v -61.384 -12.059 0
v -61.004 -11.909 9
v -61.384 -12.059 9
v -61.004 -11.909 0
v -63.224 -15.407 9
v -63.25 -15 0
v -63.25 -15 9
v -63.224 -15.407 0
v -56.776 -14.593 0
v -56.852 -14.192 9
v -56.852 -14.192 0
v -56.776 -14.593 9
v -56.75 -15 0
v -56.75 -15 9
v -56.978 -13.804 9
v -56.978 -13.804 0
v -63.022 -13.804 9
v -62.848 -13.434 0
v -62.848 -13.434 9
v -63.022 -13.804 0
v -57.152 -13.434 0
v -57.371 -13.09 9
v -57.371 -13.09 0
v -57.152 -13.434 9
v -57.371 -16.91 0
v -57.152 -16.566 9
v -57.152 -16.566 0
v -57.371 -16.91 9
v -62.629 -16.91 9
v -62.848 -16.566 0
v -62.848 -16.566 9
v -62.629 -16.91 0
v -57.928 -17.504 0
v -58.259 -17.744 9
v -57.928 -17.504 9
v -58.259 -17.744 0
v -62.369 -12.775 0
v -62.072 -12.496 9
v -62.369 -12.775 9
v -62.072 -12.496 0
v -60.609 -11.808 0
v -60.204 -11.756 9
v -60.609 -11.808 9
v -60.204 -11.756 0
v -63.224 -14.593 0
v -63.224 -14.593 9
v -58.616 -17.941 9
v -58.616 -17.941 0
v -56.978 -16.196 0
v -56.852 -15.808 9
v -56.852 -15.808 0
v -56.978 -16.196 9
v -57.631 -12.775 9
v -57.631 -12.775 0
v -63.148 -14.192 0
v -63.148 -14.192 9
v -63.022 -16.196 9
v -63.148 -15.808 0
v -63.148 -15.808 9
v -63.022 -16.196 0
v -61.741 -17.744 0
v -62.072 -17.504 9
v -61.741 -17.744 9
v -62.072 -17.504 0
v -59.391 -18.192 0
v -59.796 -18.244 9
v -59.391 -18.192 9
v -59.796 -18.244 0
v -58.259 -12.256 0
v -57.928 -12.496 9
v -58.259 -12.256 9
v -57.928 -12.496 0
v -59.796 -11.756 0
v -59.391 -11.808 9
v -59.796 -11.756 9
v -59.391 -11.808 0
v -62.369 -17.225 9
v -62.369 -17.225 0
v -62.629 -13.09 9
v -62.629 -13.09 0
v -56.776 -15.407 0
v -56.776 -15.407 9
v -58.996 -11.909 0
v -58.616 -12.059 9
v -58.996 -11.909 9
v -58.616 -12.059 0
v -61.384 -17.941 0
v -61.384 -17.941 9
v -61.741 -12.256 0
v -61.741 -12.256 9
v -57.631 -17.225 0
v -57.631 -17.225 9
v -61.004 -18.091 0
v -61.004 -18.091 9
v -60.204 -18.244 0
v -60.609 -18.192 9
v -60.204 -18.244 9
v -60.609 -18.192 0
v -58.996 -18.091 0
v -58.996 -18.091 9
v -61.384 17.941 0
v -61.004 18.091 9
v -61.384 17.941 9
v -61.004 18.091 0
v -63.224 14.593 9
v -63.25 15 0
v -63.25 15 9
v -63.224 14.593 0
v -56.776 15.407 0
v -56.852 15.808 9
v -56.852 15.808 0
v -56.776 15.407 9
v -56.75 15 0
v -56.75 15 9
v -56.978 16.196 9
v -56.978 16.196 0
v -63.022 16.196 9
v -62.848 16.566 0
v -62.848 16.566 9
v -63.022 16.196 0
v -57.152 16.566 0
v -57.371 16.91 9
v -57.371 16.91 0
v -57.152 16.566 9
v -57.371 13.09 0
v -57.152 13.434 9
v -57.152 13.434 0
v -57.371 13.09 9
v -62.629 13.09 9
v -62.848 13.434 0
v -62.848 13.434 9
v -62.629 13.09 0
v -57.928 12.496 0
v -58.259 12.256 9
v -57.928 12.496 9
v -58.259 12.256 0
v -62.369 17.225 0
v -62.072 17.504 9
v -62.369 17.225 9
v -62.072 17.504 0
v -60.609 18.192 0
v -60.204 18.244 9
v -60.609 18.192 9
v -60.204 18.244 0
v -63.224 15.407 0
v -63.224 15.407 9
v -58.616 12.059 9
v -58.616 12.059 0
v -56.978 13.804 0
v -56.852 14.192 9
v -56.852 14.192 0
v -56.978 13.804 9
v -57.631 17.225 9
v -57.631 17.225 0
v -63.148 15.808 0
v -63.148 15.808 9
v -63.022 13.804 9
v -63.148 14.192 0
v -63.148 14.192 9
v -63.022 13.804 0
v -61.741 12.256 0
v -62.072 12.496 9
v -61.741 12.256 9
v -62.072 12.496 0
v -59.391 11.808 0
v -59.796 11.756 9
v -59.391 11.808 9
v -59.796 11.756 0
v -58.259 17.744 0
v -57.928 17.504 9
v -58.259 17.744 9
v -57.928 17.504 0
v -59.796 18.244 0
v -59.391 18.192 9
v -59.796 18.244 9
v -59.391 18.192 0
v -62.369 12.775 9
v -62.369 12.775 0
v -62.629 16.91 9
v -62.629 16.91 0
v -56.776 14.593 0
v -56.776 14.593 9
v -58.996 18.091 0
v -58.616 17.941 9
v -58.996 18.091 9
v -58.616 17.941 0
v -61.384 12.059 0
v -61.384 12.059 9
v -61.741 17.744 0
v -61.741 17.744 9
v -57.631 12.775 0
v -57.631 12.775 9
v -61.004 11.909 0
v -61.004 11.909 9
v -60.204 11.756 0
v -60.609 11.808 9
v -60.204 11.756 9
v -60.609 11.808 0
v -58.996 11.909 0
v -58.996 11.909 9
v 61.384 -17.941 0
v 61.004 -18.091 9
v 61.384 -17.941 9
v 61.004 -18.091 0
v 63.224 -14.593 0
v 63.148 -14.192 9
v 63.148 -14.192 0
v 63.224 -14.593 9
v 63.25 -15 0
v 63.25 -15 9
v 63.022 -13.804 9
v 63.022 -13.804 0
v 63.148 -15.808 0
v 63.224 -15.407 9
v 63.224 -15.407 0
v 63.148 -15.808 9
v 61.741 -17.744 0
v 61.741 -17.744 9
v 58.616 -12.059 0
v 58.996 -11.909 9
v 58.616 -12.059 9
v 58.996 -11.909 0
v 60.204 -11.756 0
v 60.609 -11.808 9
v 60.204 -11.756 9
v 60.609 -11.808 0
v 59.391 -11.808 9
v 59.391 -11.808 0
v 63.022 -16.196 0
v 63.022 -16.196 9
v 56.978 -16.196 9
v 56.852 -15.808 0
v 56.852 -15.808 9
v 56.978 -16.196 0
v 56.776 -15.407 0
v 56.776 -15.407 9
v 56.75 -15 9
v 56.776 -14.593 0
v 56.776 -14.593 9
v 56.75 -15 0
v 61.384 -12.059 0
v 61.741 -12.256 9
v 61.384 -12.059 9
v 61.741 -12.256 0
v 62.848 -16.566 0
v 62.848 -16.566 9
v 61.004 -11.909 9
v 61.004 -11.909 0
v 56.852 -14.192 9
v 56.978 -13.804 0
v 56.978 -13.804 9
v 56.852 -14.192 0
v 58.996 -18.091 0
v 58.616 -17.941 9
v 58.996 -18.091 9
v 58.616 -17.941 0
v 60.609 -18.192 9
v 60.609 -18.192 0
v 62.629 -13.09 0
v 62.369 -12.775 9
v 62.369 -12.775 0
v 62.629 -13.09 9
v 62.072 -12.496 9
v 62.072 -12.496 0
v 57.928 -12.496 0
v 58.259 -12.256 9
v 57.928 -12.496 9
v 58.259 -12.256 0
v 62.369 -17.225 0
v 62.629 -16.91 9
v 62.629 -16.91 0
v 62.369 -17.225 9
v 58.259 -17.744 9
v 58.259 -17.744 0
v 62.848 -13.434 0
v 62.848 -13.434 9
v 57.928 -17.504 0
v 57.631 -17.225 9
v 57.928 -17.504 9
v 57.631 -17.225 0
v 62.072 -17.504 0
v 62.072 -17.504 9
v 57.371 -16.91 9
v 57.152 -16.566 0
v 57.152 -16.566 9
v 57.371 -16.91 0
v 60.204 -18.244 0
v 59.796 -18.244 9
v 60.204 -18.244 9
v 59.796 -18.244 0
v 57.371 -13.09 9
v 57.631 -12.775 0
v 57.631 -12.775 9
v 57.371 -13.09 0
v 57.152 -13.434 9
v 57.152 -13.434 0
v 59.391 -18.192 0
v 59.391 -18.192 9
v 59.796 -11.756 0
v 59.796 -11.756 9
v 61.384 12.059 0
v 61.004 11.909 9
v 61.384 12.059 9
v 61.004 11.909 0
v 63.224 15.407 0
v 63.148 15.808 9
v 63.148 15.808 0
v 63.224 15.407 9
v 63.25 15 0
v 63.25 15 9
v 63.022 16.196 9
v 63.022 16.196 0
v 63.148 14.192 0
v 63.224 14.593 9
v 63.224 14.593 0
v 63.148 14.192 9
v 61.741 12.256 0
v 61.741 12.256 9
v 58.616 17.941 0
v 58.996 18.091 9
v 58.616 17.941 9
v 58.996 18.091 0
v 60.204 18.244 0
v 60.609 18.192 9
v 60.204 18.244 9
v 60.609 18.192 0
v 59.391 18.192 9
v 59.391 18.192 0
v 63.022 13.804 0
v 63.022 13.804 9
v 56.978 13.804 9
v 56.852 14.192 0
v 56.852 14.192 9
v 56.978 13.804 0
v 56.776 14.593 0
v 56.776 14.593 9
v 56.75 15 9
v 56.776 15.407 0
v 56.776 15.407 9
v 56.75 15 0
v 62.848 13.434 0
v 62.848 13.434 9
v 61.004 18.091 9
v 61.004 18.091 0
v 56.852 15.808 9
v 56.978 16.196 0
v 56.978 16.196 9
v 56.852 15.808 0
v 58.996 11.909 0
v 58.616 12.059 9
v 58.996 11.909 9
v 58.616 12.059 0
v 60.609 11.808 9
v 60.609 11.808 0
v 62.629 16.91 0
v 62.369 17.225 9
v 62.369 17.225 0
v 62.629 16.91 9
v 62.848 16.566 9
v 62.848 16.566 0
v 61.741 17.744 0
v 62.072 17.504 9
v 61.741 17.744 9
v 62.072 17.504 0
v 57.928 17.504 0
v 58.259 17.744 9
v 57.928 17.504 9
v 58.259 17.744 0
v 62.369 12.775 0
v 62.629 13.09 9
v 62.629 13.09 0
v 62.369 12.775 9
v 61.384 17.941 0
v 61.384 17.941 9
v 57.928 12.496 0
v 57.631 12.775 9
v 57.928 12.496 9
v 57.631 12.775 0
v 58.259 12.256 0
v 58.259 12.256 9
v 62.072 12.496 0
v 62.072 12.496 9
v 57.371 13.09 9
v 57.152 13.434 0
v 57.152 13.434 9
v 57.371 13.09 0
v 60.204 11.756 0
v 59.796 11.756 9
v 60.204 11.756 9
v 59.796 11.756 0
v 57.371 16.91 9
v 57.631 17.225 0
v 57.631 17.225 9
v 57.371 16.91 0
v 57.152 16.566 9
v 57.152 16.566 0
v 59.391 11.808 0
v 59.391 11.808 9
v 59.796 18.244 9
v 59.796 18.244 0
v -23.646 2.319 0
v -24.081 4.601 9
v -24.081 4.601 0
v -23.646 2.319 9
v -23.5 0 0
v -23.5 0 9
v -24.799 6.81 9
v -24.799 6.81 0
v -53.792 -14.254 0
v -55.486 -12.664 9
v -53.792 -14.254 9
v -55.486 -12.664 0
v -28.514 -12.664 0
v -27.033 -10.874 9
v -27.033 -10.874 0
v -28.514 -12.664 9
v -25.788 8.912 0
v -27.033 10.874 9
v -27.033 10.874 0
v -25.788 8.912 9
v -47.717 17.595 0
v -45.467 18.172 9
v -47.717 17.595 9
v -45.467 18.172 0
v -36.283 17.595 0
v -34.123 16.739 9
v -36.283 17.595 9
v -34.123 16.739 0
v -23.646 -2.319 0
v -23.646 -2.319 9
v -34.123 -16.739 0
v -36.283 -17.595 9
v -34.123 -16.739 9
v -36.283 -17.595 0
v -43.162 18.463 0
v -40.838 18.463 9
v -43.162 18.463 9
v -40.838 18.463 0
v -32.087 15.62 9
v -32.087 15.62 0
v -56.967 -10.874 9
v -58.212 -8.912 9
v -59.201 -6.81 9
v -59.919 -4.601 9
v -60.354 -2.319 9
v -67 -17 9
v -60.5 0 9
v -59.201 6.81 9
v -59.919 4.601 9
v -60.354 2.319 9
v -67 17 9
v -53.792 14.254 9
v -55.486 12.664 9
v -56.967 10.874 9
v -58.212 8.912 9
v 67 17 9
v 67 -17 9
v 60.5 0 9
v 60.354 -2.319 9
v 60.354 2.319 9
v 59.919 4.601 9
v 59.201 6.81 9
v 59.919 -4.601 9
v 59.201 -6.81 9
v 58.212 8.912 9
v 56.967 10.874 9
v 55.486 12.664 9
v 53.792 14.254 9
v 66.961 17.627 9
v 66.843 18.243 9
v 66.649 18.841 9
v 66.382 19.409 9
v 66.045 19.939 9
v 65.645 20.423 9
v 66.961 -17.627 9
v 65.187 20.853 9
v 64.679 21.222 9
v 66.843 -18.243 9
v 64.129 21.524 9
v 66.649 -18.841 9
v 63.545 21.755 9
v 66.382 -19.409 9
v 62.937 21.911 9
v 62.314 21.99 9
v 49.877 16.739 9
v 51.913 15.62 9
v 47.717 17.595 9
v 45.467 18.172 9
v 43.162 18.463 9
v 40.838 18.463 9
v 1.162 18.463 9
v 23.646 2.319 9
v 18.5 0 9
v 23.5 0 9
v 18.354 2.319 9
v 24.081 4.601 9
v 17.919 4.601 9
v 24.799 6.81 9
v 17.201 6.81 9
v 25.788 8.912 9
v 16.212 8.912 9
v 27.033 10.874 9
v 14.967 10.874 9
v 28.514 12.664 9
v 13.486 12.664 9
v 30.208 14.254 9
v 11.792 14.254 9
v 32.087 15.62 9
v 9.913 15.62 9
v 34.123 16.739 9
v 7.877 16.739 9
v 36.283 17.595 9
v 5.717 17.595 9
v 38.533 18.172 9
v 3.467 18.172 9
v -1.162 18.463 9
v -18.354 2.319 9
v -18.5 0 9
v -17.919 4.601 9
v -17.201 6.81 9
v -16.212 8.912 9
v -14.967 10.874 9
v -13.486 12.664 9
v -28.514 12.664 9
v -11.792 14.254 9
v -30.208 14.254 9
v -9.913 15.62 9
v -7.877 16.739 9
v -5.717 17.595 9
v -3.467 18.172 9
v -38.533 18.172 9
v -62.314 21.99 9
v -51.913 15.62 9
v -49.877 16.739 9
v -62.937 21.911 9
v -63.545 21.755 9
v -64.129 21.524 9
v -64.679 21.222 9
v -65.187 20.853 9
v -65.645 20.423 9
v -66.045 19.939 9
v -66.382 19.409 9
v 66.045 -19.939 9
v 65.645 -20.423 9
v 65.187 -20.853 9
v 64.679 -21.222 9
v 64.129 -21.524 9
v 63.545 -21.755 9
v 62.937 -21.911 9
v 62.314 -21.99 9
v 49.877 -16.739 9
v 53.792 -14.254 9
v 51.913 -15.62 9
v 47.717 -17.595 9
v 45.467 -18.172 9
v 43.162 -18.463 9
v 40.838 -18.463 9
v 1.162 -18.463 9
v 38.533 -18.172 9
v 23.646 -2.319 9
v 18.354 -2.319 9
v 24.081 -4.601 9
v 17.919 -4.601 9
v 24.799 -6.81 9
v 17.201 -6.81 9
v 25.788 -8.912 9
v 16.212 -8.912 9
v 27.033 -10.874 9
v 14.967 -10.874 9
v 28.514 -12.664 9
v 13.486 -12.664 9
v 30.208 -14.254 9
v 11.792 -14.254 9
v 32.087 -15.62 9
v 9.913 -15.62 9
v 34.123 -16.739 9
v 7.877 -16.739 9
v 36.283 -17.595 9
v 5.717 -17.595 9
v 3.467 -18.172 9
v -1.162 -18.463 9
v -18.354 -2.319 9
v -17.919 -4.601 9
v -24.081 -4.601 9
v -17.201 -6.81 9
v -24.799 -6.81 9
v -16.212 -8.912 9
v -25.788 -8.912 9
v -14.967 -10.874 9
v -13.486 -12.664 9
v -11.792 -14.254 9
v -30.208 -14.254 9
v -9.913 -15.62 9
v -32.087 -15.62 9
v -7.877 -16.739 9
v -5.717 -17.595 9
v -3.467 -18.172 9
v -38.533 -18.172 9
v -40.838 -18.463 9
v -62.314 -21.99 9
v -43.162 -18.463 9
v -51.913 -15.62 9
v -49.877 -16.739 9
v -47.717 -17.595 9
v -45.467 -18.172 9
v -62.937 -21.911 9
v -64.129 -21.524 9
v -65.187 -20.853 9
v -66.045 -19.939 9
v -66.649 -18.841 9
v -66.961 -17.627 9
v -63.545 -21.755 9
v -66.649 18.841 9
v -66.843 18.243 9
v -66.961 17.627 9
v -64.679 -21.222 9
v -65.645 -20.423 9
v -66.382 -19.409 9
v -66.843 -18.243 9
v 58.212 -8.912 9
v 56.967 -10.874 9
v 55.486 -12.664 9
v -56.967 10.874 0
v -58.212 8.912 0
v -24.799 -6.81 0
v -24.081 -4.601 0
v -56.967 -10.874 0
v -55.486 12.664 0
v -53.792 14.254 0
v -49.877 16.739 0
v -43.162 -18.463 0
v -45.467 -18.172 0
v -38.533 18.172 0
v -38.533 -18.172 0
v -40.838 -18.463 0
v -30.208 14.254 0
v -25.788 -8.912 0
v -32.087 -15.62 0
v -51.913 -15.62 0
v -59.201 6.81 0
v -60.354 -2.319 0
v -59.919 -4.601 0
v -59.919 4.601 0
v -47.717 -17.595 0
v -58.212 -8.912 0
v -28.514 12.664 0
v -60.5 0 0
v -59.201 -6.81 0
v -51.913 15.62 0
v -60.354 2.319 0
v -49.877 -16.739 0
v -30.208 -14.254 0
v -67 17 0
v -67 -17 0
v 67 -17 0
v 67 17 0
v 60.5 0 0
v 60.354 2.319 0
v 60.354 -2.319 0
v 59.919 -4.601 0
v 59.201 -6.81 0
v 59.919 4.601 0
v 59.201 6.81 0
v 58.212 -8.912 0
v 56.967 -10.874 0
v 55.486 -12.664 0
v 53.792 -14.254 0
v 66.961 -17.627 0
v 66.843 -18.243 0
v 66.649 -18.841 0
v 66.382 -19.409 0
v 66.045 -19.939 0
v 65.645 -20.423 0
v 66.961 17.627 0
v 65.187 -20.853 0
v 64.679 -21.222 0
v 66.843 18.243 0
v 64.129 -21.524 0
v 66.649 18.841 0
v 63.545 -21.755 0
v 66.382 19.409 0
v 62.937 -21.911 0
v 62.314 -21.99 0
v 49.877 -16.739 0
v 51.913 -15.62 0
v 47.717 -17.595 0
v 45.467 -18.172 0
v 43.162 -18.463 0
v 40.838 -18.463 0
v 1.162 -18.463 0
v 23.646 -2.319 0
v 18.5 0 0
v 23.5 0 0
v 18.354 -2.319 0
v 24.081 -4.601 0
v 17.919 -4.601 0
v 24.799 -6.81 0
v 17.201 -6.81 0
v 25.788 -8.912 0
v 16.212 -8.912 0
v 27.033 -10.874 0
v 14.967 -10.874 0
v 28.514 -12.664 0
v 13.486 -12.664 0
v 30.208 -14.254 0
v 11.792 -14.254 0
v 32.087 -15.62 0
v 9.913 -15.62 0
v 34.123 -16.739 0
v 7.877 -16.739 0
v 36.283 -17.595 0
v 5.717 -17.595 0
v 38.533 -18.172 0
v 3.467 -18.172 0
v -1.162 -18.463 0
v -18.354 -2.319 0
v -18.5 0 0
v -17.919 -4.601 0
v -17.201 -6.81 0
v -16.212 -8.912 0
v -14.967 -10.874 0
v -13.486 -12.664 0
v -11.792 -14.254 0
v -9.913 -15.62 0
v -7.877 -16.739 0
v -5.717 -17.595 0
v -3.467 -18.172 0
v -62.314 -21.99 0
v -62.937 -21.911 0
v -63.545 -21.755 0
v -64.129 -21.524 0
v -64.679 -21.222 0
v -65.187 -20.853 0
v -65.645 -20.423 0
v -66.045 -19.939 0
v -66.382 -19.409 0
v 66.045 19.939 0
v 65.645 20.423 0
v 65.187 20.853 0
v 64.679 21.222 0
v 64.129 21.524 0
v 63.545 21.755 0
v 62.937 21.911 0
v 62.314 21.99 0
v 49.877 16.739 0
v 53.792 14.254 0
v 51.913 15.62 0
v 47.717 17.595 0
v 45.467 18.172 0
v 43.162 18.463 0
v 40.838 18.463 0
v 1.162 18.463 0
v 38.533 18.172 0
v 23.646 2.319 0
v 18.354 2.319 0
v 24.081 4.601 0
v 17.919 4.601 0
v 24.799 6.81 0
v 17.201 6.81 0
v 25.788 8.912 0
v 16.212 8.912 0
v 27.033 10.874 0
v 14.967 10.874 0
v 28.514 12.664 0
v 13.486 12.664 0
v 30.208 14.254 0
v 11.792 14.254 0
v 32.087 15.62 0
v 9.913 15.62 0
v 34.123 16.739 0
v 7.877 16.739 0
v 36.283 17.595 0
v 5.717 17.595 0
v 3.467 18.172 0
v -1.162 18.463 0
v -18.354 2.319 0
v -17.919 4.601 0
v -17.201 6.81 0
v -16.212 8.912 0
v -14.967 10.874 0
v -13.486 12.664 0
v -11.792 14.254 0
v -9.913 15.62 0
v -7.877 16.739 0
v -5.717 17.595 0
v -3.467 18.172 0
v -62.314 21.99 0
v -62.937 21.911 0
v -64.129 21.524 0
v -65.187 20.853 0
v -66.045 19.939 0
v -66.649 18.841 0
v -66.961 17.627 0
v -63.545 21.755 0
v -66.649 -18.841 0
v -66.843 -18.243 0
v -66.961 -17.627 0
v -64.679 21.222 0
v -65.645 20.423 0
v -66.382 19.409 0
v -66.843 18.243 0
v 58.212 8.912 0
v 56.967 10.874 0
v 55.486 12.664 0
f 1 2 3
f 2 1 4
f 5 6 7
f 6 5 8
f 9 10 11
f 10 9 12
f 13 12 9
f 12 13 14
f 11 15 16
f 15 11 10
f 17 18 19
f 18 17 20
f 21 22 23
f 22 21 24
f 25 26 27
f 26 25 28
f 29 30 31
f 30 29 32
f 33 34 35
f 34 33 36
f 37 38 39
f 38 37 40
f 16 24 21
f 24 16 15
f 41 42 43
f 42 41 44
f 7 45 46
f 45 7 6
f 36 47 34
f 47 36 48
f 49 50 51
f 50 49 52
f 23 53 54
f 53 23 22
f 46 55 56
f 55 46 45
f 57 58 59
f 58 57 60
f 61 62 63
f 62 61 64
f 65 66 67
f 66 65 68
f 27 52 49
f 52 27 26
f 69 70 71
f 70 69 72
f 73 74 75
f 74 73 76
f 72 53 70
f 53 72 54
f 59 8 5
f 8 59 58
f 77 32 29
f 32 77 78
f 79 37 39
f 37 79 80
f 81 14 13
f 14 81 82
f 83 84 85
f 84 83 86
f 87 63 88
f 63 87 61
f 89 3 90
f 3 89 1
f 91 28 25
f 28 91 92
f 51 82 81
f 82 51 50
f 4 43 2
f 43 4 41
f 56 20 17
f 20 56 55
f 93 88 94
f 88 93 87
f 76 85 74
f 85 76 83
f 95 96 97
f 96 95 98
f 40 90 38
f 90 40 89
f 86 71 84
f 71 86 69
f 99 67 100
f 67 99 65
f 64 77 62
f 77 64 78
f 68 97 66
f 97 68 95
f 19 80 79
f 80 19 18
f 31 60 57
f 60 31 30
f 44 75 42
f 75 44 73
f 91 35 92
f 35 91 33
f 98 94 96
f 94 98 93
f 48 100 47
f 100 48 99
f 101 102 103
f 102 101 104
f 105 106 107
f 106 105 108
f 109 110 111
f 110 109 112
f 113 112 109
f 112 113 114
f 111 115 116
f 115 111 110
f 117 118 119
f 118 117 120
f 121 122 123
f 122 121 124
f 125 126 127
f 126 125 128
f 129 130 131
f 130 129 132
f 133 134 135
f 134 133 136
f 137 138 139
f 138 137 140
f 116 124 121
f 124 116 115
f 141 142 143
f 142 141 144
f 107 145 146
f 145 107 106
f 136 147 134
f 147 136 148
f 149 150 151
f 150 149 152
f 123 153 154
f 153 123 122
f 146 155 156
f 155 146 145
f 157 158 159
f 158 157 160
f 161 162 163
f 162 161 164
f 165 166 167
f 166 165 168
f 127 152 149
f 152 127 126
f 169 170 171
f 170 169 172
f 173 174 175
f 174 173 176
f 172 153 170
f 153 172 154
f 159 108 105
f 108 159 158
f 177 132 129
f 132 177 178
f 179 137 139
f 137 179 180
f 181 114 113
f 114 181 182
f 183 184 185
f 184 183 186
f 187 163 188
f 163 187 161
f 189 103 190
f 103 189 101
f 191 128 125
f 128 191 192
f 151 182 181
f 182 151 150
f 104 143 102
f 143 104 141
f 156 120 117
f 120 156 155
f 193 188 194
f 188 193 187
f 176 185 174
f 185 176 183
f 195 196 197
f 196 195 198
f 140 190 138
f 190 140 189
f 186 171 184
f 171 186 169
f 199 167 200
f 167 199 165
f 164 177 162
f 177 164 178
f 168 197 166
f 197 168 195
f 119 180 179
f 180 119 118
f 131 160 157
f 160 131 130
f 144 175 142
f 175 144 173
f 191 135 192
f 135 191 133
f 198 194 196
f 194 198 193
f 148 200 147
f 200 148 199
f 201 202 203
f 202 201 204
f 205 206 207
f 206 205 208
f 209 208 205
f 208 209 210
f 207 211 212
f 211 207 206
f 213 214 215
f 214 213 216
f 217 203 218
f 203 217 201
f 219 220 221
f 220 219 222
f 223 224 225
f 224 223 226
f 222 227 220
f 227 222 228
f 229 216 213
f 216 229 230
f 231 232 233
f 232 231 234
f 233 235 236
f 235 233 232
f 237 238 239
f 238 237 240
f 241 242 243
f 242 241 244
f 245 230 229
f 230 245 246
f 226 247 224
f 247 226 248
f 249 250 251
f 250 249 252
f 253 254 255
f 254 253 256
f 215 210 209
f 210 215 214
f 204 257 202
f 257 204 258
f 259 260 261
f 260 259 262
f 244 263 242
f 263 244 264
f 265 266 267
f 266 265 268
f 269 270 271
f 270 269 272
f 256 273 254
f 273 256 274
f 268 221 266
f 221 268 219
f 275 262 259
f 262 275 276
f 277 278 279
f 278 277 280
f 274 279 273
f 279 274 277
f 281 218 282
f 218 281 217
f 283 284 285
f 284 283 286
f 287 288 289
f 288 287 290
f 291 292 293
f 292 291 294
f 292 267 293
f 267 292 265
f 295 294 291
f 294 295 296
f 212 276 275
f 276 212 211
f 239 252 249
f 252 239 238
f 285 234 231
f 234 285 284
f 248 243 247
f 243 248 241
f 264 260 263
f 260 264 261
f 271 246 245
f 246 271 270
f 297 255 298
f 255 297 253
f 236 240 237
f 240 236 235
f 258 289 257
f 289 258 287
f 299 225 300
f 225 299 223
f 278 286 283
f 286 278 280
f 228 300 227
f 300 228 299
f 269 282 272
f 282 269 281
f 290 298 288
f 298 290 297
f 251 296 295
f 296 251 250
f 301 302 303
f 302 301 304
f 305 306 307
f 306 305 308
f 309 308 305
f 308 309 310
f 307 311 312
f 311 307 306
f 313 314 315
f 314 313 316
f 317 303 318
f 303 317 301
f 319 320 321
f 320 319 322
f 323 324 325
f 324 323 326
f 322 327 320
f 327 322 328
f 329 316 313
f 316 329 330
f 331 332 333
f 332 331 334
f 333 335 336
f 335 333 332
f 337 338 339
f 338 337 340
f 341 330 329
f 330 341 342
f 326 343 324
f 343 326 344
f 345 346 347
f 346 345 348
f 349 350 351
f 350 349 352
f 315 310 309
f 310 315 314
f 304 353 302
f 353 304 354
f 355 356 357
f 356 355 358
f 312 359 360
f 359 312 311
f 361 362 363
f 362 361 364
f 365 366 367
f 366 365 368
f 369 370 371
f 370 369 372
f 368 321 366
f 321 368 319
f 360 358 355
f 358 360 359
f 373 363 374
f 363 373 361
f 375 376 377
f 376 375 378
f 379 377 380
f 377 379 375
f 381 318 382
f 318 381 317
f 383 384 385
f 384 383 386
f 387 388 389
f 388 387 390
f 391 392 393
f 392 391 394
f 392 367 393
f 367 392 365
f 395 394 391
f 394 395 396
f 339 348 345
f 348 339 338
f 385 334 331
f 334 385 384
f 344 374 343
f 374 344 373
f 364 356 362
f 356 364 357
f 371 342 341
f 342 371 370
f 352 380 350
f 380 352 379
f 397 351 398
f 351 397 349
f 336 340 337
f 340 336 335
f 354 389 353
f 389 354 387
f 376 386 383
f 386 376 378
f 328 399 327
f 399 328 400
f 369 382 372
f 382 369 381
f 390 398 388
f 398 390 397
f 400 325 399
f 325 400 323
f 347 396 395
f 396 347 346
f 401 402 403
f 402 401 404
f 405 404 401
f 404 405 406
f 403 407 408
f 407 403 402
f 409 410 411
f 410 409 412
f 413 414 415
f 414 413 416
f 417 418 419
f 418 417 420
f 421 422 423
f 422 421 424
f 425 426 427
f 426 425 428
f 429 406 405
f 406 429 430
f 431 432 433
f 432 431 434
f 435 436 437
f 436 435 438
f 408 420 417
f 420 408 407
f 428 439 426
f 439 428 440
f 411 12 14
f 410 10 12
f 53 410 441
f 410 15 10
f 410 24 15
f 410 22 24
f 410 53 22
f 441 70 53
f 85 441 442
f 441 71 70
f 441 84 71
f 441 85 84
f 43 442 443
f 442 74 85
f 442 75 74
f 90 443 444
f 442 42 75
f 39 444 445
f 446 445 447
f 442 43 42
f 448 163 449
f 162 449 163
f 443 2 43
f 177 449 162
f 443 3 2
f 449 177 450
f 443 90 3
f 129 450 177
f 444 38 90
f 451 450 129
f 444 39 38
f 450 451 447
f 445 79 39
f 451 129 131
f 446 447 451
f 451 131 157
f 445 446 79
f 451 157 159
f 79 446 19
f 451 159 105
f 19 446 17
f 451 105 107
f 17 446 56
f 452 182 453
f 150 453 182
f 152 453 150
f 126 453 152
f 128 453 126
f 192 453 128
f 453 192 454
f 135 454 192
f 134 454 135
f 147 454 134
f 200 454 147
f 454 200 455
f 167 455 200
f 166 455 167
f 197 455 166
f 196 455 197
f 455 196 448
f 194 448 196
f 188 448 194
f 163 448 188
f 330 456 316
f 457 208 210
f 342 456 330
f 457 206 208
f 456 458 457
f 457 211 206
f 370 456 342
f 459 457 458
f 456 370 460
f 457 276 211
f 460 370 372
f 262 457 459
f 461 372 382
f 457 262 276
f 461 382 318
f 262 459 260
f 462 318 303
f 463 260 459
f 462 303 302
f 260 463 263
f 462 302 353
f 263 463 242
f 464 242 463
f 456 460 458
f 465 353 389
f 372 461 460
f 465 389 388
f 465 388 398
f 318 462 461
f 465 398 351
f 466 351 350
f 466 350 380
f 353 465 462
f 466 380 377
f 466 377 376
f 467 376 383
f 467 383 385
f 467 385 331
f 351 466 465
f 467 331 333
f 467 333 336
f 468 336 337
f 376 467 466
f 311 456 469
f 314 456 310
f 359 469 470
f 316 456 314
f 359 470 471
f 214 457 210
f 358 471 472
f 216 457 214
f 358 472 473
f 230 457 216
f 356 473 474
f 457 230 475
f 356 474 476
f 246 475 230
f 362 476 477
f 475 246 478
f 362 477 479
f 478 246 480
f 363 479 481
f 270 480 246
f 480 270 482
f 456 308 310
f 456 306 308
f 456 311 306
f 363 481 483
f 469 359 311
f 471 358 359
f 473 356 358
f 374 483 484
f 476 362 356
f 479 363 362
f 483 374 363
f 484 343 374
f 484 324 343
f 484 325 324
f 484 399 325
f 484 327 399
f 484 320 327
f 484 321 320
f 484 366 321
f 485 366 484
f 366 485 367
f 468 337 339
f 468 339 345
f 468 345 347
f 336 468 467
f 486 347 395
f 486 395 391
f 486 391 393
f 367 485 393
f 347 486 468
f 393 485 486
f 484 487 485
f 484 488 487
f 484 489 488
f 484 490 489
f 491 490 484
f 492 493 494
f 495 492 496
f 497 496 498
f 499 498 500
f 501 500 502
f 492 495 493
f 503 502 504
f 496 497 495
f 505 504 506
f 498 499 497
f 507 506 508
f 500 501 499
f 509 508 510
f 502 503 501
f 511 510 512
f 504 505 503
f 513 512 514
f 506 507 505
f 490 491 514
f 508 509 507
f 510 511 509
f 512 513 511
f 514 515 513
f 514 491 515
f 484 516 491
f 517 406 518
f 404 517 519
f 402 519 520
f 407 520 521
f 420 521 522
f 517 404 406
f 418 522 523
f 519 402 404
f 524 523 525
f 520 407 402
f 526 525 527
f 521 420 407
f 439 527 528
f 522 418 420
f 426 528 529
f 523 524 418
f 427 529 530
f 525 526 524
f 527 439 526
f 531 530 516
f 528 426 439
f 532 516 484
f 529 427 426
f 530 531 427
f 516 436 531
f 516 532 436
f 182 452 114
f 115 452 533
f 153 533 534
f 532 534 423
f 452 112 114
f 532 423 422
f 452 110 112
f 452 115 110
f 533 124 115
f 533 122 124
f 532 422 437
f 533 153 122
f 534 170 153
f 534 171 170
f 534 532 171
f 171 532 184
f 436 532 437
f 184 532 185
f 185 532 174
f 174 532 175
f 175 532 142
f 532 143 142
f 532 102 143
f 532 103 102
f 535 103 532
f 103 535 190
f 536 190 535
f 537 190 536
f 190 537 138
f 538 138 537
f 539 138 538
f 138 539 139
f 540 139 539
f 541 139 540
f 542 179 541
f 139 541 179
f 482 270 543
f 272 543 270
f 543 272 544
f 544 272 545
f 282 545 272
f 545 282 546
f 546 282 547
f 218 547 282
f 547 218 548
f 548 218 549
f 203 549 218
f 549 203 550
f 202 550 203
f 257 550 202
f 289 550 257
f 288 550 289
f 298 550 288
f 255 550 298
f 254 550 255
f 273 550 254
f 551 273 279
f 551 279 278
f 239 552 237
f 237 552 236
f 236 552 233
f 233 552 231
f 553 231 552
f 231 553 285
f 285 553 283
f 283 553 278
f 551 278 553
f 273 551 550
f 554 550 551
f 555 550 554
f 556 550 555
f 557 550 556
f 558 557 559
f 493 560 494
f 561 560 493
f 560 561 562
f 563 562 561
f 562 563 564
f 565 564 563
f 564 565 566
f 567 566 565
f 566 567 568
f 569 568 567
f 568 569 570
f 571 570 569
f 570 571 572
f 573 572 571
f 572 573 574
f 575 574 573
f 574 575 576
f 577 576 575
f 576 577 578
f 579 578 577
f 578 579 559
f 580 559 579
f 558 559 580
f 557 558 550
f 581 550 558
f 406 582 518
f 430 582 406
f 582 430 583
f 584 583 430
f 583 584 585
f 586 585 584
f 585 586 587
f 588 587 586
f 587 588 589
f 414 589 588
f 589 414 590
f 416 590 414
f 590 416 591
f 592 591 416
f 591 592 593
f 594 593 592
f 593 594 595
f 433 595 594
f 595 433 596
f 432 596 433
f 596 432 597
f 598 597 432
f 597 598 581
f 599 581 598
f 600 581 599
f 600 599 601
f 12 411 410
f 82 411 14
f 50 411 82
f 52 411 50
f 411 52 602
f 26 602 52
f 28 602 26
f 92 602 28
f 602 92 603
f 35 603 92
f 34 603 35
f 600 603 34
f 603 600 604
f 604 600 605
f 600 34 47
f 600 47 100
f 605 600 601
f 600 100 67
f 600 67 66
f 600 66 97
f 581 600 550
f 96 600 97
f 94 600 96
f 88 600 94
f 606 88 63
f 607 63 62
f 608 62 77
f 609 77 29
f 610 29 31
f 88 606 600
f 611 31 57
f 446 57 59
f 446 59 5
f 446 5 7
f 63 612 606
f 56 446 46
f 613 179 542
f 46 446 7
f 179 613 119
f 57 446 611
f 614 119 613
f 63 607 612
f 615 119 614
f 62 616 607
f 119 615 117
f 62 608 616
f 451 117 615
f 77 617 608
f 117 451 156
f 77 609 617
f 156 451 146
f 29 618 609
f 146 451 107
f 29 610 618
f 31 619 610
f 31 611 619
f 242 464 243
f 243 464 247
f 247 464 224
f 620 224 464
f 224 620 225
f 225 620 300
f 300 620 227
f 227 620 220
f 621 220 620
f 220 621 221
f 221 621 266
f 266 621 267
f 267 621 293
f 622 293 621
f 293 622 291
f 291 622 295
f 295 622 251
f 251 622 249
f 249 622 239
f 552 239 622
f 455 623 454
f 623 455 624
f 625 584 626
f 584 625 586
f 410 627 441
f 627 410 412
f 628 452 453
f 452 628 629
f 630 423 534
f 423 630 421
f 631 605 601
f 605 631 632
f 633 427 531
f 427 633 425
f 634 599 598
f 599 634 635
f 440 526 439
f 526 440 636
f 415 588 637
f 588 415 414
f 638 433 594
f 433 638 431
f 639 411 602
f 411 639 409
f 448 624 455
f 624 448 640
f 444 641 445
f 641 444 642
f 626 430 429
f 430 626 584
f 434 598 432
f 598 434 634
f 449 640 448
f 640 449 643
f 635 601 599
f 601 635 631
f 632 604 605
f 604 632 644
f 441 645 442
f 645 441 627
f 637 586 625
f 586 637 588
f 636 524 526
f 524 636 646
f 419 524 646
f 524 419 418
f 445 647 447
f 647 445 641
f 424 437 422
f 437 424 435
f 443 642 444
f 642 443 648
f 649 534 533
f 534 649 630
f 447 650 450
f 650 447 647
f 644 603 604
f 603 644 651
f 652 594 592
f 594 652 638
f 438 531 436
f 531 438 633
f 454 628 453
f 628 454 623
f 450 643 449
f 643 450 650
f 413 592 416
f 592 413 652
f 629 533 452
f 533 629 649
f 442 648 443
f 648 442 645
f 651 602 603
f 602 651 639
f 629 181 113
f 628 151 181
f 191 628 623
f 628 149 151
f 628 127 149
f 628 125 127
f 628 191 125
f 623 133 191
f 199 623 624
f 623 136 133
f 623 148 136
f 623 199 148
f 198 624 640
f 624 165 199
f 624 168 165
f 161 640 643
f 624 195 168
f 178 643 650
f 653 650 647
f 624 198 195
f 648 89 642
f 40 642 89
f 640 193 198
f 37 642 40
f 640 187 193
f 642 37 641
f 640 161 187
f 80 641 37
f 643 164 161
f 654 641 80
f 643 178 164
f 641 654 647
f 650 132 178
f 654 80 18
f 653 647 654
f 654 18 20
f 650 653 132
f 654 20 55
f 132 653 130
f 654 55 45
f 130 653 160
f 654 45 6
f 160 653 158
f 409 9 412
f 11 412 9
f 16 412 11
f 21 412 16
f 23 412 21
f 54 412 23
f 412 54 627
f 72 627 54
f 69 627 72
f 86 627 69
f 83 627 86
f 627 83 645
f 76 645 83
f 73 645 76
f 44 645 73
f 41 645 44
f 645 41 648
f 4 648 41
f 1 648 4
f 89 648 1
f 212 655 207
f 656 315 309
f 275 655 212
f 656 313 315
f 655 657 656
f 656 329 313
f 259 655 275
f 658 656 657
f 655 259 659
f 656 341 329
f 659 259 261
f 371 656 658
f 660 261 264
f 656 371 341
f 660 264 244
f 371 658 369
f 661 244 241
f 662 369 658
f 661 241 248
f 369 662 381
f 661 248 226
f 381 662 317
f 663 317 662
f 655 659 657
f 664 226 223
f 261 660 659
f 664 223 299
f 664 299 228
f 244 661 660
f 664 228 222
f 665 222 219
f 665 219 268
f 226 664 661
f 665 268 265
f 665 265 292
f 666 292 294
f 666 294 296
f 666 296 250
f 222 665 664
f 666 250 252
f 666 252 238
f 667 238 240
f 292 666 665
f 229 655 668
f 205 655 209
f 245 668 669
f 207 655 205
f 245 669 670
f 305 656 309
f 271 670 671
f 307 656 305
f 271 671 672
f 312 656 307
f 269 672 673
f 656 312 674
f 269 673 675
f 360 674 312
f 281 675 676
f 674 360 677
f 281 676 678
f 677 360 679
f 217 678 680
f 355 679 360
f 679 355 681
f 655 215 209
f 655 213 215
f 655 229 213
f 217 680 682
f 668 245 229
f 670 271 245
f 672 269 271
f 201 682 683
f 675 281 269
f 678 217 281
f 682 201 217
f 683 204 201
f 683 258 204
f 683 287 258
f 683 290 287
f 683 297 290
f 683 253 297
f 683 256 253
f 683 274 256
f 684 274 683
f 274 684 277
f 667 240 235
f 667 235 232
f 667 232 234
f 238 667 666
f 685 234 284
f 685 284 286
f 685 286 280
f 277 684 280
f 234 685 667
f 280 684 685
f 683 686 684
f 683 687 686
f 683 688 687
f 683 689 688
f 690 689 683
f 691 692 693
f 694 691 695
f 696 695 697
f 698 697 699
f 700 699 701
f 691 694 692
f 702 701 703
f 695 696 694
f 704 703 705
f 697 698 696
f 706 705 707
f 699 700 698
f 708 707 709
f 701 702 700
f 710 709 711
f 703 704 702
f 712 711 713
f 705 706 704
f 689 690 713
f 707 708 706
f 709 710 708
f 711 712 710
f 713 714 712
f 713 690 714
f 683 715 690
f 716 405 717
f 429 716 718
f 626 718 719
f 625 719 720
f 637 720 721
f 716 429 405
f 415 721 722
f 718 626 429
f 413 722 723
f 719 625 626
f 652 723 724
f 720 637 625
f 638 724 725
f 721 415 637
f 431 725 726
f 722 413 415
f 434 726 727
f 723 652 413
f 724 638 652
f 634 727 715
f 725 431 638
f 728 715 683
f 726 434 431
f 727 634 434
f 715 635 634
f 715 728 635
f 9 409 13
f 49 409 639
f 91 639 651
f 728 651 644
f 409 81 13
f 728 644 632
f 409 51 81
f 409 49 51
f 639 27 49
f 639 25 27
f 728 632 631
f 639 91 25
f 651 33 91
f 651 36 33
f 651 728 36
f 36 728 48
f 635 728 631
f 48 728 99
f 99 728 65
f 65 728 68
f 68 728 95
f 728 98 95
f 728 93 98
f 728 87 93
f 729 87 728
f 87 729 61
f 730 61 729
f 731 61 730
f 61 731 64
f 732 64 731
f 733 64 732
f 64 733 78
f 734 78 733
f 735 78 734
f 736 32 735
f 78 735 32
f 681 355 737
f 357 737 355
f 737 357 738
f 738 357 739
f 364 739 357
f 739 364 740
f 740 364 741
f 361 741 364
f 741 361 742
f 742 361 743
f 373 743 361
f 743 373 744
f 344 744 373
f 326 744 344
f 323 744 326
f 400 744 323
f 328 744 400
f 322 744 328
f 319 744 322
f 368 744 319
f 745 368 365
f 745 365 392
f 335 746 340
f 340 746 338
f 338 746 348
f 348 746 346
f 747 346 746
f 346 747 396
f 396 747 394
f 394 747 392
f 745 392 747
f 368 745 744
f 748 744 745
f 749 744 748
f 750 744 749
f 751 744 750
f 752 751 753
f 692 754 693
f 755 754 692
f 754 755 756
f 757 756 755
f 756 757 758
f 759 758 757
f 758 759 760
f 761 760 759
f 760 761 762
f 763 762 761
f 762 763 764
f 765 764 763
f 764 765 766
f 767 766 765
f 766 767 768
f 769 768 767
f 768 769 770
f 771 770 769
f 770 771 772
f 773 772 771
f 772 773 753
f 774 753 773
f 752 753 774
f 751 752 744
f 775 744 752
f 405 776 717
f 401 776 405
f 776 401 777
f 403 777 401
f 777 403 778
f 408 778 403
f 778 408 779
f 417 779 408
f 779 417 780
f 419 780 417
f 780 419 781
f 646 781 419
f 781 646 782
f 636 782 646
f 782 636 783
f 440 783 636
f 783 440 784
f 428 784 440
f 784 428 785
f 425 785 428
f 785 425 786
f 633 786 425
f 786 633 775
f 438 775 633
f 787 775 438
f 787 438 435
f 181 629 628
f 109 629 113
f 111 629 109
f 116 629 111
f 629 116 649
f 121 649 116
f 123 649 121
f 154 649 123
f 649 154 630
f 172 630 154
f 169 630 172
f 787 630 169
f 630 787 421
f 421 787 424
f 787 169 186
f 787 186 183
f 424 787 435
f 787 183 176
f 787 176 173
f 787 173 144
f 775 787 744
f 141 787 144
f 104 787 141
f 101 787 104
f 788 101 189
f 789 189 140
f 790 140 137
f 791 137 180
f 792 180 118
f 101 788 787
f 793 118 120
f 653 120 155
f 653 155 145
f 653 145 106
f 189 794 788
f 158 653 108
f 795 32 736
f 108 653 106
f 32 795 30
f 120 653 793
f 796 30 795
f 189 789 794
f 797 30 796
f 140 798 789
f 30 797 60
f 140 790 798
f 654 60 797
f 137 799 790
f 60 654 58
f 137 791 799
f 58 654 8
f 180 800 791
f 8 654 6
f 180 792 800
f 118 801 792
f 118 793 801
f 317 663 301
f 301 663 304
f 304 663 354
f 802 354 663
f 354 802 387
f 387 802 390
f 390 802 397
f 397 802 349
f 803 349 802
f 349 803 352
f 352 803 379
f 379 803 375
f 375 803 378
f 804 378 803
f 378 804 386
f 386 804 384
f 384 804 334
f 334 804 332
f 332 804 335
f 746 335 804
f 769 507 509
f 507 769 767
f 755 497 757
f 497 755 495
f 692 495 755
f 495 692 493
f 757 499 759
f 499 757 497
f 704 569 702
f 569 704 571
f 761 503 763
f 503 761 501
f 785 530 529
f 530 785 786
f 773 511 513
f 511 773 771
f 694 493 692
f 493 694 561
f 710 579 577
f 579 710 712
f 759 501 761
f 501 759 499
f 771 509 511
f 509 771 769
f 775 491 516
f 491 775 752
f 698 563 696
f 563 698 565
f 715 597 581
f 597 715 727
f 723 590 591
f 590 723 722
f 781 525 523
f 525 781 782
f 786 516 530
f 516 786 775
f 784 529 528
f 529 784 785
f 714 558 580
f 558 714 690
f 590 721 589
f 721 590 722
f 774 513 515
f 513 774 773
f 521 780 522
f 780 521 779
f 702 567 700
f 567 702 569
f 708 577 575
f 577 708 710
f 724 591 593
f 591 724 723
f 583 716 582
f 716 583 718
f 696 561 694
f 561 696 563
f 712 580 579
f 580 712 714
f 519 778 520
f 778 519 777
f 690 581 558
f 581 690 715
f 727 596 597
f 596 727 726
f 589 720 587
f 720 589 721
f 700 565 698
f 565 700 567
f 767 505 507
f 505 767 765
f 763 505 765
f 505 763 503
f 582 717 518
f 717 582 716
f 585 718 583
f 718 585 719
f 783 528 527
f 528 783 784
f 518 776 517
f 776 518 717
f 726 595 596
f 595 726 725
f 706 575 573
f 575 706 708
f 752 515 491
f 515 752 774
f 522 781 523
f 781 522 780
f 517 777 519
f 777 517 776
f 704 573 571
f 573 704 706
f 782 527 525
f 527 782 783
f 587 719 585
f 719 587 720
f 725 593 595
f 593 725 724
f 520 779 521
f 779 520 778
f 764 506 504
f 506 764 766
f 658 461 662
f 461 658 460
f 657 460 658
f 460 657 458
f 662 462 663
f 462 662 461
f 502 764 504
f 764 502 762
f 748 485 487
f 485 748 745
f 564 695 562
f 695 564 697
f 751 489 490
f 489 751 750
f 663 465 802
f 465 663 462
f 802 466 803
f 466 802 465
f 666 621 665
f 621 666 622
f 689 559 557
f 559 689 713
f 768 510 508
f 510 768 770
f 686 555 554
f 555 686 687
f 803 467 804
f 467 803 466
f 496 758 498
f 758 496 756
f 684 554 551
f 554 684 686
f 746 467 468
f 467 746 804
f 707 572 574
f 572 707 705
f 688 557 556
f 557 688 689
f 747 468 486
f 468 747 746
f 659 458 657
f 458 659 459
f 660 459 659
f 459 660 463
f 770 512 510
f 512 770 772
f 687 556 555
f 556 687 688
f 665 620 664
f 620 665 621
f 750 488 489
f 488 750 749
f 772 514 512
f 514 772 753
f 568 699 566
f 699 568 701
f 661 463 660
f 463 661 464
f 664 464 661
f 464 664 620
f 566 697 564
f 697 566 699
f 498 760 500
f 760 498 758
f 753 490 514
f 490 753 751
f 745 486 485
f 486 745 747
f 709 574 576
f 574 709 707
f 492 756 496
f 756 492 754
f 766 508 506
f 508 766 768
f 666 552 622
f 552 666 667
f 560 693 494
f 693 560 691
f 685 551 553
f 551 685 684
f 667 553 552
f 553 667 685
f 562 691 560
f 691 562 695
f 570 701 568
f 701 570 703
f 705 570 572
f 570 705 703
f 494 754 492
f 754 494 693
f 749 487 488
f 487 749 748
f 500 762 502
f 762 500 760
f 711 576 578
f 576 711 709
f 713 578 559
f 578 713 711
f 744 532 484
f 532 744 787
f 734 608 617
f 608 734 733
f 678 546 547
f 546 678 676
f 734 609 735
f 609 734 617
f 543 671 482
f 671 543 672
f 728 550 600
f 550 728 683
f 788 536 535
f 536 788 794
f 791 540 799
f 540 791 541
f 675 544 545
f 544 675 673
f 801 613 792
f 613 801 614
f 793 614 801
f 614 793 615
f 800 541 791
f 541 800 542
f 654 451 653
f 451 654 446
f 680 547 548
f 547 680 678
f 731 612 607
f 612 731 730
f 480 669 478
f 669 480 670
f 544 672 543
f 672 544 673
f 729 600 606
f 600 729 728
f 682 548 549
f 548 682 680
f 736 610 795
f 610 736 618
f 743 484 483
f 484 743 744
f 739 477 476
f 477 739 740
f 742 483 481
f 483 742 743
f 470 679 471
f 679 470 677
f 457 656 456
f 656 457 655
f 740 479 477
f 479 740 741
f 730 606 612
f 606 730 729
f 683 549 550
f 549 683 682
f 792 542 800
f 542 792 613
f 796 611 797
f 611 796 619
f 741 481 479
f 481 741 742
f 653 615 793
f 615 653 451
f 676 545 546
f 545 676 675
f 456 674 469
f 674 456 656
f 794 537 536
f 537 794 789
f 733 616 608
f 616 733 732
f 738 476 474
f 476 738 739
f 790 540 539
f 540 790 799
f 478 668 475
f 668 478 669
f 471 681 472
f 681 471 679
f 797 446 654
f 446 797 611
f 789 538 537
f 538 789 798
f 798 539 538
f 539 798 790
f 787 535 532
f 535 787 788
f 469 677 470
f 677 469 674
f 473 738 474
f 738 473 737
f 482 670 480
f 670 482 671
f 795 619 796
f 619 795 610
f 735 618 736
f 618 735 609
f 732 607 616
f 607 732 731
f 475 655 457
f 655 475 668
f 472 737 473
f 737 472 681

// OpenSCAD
$fn = 50;


difference() {
	union() {
		hull() {
			translate(v = [-62.0000000000, 17.0000000000, 0]) {
				cylinder(h = 9, r = 5);
			}
			translate(v = [62.0000000000, 17.0000000000, 0]) {
				cylinder(h = 9, r = 5);
			}
			translate(v = [-62.0000000000, -17.0000000000, 0]) {
				cylinder(h = 9, r = 5);
			}
			translate(v = [62.0000000000, -17.0000000000, 0]) {
				cylinder(h = 9, r = 5);
			}
		}
	}
	union() {
		#translate(v = [-60.0000000000, -15.0000000000, -100.0000000000]) {
			cylinder(h = 200, r = 3.2500000000);
		}
		#translate(v = [-60.0000000000, 15.0000000000, -100.0000000000]) {
			cylinder(h = 200, r = 3.2500000000);
		}
		#translate(v = [60.0000000000, -15.0000000000, -100.0000000000]) {
			cylinder(h = 200, r = 3.2500000000);
		}
		#translate(v = [60.0000000000, 15.0000000000, -100.0000000000]) {
			cylinder(h = 200, r = 3.2500000000);
		}
		#translate(v = [-42.0000000000, 0, 0]) {
			cylinder(h = 9, r = 18.5000000000);
		}
		#cylinder(h = 9, r = 18.5000000000);
		#translate(v = [42.0000000000, 0, 0]) {
			cylinder(h = 9, r = 18.5000000000);
		}
	}
}
